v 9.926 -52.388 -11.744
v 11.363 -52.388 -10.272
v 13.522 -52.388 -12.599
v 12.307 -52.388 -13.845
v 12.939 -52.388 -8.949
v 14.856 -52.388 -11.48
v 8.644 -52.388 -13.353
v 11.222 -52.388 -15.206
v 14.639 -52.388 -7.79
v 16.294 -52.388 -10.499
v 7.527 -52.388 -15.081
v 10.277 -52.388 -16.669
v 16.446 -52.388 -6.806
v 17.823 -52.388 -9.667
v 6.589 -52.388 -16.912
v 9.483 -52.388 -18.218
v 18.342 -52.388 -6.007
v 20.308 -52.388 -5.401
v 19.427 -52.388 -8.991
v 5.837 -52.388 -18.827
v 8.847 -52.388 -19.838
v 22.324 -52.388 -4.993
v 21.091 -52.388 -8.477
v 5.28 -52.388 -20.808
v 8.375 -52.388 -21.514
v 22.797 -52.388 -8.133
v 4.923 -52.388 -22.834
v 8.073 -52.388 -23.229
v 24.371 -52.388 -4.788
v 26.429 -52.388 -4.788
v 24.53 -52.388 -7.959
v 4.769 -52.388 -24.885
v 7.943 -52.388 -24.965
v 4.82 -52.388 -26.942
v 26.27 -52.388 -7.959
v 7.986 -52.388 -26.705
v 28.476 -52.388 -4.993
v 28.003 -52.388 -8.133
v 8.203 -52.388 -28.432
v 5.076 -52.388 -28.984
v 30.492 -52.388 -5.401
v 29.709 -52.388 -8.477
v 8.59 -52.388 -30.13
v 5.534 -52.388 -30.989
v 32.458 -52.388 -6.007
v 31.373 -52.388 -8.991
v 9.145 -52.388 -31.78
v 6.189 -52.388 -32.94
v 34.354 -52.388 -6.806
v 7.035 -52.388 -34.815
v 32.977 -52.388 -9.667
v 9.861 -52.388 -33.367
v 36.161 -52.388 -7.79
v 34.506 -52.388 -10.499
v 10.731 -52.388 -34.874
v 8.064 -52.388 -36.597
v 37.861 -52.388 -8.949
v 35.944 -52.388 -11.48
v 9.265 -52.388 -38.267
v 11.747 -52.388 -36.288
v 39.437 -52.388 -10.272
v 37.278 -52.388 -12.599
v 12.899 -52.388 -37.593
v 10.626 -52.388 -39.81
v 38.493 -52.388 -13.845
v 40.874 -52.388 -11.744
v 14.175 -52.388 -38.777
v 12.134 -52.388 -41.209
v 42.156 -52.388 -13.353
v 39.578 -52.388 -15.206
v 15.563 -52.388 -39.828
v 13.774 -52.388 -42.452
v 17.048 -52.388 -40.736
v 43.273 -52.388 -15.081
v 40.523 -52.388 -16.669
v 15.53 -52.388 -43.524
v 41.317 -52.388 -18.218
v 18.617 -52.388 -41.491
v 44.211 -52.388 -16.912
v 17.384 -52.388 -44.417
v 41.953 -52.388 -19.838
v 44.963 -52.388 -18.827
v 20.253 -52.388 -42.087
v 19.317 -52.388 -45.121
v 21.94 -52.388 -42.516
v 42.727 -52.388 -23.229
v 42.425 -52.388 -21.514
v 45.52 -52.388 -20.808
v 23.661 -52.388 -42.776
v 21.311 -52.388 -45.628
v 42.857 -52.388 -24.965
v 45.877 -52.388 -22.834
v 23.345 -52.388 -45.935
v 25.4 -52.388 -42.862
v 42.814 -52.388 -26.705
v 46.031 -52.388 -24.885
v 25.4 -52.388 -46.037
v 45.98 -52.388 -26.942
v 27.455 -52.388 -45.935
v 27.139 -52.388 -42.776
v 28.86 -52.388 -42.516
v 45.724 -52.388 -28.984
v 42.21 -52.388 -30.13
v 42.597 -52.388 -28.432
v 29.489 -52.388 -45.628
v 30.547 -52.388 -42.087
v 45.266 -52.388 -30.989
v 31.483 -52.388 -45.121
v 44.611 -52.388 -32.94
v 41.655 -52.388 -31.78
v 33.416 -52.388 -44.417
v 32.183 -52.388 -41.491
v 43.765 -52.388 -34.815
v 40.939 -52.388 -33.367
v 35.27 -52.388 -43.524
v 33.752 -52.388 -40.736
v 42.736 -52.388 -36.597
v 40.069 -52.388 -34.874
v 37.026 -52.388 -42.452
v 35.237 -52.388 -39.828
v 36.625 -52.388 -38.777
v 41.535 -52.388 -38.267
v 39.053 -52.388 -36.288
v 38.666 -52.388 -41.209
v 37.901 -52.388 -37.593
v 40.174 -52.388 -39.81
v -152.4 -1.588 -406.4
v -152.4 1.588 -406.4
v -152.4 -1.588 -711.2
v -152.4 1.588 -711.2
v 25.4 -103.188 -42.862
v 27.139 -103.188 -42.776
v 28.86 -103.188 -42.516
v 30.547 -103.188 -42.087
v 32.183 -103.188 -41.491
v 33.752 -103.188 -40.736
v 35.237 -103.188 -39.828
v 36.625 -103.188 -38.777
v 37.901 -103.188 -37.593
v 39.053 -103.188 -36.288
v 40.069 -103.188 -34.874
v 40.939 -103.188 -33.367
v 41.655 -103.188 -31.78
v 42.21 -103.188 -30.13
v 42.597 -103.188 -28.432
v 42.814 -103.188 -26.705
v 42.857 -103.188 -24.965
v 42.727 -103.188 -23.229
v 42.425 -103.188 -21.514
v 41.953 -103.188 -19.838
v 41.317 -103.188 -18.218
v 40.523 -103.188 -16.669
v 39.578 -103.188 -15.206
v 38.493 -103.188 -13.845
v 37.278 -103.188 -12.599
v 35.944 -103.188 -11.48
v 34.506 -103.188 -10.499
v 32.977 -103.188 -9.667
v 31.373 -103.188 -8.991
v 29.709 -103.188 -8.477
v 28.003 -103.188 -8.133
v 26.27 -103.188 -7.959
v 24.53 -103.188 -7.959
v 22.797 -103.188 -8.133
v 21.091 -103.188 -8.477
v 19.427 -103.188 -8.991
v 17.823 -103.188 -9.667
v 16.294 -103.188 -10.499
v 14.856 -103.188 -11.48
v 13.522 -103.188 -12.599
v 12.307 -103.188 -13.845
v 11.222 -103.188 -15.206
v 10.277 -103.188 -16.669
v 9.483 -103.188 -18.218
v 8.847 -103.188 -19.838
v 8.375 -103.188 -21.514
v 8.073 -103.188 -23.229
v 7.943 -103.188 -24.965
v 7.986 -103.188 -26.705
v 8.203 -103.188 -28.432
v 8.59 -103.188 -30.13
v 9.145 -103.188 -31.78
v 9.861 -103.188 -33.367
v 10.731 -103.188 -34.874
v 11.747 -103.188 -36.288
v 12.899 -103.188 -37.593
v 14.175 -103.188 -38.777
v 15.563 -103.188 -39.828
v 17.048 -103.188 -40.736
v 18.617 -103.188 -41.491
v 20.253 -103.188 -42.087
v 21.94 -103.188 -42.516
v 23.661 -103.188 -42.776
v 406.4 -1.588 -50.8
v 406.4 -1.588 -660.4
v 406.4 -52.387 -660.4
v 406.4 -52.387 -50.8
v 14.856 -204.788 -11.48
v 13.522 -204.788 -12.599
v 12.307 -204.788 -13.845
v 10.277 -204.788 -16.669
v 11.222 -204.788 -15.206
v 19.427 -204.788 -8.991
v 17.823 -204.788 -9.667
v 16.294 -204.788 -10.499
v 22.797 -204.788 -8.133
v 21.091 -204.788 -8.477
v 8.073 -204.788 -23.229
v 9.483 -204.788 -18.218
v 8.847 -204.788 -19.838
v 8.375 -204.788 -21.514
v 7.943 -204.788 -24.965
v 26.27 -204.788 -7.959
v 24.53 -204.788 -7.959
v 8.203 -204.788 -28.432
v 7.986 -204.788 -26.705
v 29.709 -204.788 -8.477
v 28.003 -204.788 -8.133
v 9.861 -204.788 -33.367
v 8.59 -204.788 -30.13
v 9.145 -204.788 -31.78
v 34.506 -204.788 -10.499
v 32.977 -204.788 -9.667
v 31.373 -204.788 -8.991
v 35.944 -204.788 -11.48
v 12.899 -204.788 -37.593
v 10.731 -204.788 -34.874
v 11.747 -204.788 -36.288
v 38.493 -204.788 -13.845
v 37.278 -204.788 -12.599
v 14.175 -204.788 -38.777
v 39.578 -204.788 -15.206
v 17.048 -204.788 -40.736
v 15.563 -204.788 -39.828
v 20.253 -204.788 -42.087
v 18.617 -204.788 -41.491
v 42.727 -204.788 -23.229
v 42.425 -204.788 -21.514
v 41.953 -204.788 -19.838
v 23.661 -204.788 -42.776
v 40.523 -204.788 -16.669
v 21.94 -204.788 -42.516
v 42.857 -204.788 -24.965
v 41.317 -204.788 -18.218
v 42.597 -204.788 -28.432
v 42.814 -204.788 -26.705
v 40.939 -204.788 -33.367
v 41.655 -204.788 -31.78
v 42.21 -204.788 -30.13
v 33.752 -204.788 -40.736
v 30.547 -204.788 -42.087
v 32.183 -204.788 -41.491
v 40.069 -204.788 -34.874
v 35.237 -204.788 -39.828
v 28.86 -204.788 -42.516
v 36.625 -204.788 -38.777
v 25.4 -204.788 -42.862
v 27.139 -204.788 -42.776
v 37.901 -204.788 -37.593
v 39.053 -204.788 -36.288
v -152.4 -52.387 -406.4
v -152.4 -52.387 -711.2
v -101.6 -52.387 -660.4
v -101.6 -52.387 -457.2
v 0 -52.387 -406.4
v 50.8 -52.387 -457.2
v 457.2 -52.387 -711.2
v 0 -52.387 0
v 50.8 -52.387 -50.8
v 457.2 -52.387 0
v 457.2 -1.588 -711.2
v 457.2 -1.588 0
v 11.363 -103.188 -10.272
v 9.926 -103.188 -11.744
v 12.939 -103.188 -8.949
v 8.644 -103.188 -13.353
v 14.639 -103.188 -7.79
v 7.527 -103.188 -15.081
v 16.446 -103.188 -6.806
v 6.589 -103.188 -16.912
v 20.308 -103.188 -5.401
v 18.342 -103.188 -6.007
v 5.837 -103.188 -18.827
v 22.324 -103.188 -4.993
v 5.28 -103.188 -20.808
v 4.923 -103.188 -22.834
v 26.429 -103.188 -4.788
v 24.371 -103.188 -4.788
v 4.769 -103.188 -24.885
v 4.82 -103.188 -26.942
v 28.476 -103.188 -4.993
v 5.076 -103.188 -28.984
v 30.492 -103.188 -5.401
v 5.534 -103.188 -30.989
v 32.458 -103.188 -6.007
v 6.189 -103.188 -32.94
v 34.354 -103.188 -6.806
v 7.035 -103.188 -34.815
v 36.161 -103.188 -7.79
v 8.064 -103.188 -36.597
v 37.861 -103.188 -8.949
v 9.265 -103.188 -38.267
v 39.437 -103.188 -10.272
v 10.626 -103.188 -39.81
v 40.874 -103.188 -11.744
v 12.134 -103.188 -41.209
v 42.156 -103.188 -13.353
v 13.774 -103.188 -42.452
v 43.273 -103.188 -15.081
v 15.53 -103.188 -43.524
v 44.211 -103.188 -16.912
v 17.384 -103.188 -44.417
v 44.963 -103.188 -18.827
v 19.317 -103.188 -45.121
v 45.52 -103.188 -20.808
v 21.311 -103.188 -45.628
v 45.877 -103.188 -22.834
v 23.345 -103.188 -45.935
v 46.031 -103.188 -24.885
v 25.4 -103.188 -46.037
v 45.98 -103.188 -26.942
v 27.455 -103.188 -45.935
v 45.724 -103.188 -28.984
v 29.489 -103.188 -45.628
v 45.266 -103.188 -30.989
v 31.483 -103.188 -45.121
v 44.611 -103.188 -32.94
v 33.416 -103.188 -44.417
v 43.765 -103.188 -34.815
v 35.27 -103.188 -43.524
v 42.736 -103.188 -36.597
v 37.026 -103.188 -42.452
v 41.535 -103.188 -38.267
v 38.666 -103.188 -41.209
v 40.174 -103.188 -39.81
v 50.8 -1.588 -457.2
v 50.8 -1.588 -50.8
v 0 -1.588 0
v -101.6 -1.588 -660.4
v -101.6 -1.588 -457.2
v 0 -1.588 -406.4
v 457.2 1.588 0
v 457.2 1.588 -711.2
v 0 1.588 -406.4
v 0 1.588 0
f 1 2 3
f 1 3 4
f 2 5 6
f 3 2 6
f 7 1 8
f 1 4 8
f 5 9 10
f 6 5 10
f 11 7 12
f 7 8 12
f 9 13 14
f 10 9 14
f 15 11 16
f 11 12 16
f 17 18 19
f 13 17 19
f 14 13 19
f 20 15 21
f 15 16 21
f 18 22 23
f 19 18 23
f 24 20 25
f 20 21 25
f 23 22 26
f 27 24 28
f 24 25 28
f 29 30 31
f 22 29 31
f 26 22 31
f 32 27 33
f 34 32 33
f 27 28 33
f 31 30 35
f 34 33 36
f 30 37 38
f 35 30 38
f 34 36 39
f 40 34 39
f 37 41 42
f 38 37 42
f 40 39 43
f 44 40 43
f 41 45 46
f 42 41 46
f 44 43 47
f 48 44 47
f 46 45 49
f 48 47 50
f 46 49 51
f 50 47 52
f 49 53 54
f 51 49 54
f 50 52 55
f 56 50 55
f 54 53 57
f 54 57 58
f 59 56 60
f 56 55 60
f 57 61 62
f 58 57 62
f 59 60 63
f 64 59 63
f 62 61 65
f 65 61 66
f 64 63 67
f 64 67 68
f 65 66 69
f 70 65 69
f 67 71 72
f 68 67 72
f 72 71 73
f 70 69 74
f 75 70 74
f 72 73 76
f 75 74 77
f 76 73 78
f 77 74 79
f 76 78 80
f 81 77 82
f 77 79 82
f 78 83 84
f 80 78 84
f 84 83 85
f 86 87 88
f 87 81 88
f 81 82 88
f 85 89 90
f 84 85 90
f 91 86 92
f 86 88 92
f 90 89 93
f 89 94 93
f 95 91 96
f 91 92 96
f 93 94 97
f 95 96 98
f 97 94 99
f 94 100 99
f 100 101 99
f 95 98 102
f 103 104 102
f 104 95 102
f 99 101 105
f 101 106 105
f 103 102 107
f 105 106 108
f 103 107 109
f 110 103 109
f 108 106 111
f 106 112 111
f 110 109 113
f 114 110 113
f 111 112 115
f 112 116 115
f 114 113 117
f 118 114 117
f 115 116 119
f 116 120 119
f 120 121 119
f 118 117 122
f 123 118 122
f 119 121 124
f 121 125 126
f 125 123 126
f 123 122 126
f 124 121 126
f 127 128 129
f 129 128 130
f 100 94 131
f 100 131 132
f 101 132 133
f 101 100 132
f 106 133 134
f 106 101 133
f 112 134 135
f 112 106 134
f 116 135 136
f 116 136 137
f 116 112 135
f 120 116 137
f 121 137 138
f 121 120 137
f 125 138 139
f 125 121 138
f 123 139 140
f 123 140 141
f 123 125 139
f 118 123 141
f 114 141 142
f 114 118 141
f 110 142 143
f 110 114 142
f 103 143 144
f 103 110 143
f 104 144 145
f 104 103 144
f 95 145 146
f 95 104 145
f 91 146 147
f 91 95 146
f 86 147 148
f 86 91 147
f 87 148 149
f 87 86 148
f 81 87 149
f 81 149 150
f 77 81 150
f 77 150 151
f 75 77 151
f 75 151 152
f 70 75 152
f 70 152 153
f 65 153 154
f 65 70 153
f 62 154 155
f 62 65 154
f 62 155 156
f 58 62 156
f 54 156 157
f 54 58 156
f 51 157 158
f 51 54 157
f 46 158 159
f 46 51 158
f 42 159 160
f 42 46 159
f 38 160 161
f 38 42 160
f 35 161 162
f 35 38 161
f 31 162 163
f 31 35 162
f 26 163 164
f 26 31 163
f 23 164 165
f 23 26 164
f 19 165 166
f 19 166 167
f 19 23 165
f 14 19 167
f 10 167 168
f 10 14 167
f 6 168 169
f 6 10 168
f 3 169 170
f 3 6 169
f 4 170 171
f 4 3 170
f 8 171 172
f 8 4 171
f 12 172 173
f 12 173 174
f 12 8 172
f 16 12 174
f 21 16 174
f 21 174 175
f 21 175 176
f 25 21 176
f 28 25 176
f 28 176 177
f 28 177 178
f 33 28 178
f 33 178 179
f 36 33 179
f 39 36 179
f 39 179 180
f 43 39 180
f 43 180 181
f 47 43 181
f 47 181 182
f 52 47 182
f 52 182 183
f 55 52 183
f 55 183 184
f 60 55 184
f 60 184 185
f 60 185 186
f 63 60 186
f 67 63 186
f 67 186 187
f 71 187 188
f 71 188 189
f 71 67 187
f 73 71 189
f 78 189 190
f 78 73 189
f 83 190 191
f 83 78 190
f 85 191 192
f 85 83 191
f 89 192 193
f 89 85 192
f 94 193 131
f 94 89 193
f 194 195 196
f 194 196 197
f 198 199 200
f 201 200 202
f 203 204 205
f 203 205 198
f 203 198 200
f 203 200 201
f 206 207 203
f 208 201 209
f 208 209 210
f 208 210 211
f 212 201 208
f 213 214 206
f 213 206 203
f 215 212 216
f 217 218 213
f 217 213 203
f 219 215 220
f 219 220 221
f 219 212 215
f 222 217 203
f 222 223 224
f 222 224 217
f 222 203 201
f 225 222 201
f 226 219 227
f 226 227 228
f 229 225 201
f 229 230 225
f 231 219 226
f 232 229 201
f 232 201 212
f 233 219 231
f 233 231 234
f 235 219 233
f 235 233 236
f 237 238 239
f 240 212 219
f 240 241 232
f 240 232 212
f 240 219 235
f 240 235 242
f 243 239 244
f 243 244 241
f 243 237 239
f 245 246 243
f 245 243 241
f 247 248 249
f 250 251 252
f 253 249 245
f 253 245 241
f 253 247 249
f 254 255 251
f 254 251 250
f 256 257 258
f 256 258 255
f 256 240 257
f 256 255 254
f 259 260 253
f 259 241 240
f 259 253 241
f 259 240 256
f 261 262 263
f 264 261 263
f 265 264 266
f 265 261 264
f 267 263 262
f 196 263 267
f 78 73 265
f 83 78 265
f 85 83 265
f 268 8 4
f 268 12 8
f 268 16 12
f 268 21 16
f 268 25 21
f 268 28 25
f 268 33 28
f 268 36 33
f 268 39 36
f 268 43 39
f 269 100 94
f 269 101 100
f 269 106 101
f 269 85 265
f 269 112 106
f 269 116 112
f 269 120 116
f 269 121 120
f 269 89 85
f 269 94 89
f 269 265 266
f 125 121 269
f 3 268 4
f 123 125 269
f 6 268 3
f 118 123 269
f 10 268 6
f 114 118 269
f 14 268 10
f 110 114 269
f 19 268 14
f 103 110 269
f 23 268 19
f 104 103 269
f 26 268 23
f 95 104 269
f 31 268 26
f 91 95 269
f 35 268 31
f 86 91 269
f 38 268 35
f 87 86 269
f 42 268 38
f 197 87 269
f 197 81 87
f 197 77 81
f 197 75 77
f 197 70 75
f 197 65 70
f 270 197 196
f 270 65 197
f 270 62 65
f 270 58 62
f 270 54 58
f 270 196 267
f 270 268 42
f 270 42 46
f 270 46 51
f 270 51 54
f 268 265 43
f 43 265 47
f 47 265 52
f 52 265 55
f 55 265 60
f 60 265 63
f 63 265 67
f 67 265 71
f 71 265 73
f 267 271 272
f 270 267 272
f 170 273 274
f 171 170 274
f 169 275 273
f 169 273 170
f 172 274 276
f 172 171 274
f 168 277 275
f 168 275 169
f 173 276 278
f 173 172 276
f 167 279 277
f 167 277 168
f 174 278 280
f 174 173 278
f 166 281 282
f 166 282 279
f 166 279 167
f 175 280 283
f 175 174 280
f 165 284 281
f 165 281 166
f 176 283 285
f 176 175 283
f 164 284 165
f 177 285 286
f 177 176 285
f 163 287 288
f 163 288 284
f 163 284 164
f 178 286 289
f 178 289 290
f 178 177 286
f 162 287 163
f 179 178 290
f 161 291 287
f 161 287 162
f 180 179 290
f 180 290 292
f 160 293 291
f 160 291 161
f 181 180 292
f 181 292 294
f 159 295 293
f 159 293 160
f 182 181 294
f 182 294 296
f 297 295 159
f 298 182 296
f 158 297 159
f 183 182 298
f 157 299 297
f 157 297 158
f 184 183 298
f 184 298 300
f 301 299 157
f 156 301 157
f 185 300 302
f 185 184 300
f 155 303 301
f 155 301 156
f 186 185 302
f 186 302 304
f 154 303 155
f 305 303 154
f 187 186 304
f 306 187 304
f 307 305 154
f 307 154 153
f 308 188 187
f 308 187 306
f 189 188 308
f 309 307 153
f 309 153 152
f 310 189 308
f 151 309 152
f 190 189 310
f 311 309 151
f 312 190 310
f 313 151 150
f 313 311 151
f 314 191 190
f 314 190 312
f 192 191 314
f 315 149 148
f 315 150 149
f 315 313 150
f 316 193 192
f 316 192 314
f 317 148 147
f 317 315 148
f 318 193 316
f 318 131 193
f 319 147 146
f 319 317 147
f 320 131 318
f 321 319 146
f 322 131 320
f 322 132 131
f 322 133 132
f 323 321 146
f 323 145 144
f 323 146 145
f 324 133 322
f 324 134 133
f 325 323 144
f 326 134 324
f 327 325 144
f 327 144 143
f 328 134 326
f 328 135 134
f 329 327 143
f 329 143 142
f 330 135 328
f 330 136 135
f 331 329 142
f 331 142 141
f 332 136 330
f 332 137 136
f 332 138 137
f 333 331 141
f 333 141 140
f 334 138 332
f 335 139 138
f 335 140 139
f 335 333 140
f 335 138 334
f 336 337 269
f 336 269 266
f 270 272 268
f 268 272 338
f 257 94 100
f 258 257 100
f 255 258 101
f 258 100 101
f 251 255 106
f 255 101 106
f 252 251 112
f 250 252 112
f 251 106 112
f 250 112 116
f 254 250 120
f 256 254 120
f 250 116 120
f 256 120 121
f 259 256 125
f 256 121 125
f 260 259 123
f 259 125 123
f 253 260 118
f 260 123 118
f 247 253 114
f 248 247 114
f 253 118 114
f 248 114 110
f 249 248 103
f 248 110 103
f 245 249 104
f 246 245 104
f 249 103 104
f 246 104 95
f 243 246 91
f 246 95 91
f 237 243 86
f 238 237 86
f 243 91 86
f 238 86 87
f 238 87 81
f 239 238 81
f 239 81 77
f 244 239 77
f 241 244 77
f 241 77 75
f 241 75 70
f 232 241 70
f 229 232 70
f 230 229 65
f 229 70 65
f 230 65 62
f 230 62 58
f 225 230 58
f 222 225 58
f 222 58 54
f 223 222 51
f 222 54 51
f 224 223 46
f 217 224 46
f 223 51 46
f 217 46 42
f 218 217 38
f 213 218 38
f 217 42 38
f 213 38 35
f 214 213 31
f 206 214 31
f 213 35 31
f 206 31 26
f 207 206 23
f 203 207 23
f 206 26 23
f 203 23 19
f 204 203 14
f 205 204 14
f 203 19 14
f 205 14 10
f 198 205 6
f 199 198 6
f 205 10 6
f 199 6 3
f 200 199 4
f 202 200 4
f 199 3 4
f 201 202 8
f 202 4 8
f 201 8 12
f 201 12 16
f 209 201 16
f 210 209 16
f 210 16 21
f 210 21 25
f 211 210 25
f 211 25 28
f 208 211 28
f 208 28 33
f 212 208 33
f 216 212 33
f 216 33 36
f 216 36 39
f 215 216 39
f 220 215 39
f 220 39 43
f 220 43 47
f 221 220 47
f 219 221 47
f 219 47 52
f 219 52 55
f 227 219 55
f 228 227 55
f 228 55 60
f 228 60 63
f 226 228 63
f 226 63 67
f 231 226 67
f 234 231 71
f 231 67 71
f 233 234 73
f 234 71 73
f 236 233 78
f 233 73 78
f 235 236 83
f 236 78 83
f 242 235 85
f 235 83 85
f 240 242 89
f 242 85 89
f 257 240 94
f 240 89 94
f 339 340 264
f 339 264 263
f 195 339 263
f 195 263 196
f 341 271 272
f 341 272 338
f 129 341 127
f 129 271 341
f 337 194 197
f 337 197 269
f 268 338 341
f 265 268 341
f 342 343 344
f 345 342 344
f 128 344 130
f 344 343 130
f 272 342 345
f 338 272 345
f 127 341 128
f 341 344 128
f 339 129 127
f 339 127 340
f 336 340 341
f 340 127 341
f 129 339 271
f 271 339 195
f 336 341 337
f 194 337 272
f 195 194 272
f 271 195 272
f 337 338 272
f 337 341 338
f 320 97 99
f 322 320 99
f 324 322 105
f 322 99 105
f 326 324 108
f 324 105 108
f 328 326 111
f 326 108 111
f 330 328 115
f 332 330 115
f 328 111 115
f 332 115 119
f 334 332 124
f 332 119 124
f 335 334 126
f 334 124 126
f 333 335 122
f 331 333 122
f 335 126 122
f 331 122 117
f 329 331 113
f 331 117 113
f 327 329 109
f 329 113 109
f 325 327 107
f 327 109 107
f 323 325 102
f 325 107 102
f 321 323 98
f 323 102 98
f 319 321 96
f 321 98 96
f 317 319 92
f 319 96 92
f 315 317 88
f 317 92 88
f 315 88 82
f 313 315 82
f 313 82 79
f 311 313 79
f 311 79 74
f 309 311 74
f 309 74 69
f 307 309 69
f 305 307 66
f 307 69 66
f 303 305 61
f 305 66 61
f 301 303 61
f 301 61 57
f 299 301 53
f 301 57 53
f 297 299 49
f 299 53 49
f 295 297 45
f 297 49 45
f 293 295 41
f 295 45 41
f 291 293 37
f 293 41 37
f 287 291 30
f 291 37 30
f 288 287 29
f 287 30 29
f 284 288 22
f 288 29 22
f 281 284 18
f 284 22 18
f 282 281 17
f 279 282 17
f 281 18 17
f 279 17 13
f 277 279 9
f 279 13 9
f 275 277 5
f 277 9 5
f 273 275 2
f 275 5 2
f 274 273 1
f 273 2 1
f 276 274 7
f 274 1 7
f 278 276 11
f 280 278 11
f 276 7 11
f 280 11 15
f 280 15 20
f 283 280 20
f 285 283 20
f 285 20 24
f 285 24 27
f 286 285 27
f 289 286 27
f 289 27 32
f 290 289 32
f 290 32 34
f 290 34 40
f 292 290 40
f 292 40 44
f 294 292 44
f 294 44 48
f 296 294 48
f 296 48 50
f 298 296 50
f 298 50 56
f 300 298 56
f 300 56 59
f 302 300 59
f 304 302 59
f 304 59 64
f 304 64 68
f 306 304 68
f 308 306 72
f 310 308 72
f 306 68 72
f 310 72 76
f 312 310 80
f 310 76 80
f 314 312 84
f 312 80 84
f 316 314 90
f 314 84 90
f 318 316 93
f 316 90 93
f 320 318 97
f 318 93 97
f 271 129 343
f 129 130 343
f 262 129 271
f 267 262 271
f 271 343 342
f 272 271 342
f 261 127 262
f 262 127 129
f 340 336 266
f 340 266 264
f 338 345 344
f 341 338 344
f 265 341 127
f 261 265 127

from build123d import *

# Parameters (mm, degrees)
BOSS_EXTRUDE1_DEPTH = 1.5875
BOSS_EXTRUDE2_DEPTH = 50.8
SKETCH3_R           = 17.4625
BOSS_EXTRUDE3_DEPTH = 152.4
SKETCH4_R           = 20.6375
SKETCH4_R_2         = 17.4625
BOSS_EXTRUDE4_DEPTH = 50.8


with BuildPart() as part:
    # Sketch1 → Boss-Extrude1 (new body, symmetric)
    with BuildSketch(Plane(origin=(0, 0, 0), x_dir=(1, 0, 0), z_dir=(0, 1, 0))):
        Polygon((0, 0), (0, 406.4), (-152.4, 406.4), (-152.4, 711.2), (457.2, 711.2), (457.2, 0), align=None)
    extrude(amount=BOSS_EXTRUDE1_DEPTH, both=True)


with BuildPart() as body_2:
    # Sketch2 → Boss-Extrude2 (new body)
    with BuildSketch(Plane.XZ.offset(1.5875)):
        Polygon((457.2, 0), (0, 0), (0, -406.4), (-152.4, -406.4), (-152.4, -711.2), (457.2, -711.2), align=None)
        Polygon((406.4, -50.8), (50.8, -50.8), (50.8, -457.2), (-101.6, -457.2), (-101.6, -660.4), (406.4, -660.4), align=None, mode=Mode.SUBTRACT)
    extrude(amount=BOSS_EXTRUDE2_DEPTH)

    # Sketch3 → Boss-Extrude3 (add)
    with BuildSketch(Plane.XZ.offset(52.3875)):
        with Locations(Location((25.4, -25.4, 0), (0, 0, 270))):  # turned: the seam where the file's is
            Circle(SKETCH3_R)
    extrude(amount=BOSS_EXTRUDE3_DEPTH)


with BuildPart() as body_3:
    # Sketch4 → Boss-Extrude4 (new body)
    with BuildSketch(Plane.XZ.offset(52.3875)):
        with Locations(Location((25.4, -25.4, 0), (0, 0, 270))):  # turned: the seam where the file's is
            Circle(SKETCH4_R)
        with Locations(Location((25.4, -25.4, 0), (0, 0, 270))):  # turned: the seam where the file's is
            Circle(SKETCH4_R_2, mode=Mode.SUBTRACT)
    extrude(amount=BOSS_EXTRUDE4_DEPTH)


solid = Compound([part.part, body_2.part, body_3.part])
